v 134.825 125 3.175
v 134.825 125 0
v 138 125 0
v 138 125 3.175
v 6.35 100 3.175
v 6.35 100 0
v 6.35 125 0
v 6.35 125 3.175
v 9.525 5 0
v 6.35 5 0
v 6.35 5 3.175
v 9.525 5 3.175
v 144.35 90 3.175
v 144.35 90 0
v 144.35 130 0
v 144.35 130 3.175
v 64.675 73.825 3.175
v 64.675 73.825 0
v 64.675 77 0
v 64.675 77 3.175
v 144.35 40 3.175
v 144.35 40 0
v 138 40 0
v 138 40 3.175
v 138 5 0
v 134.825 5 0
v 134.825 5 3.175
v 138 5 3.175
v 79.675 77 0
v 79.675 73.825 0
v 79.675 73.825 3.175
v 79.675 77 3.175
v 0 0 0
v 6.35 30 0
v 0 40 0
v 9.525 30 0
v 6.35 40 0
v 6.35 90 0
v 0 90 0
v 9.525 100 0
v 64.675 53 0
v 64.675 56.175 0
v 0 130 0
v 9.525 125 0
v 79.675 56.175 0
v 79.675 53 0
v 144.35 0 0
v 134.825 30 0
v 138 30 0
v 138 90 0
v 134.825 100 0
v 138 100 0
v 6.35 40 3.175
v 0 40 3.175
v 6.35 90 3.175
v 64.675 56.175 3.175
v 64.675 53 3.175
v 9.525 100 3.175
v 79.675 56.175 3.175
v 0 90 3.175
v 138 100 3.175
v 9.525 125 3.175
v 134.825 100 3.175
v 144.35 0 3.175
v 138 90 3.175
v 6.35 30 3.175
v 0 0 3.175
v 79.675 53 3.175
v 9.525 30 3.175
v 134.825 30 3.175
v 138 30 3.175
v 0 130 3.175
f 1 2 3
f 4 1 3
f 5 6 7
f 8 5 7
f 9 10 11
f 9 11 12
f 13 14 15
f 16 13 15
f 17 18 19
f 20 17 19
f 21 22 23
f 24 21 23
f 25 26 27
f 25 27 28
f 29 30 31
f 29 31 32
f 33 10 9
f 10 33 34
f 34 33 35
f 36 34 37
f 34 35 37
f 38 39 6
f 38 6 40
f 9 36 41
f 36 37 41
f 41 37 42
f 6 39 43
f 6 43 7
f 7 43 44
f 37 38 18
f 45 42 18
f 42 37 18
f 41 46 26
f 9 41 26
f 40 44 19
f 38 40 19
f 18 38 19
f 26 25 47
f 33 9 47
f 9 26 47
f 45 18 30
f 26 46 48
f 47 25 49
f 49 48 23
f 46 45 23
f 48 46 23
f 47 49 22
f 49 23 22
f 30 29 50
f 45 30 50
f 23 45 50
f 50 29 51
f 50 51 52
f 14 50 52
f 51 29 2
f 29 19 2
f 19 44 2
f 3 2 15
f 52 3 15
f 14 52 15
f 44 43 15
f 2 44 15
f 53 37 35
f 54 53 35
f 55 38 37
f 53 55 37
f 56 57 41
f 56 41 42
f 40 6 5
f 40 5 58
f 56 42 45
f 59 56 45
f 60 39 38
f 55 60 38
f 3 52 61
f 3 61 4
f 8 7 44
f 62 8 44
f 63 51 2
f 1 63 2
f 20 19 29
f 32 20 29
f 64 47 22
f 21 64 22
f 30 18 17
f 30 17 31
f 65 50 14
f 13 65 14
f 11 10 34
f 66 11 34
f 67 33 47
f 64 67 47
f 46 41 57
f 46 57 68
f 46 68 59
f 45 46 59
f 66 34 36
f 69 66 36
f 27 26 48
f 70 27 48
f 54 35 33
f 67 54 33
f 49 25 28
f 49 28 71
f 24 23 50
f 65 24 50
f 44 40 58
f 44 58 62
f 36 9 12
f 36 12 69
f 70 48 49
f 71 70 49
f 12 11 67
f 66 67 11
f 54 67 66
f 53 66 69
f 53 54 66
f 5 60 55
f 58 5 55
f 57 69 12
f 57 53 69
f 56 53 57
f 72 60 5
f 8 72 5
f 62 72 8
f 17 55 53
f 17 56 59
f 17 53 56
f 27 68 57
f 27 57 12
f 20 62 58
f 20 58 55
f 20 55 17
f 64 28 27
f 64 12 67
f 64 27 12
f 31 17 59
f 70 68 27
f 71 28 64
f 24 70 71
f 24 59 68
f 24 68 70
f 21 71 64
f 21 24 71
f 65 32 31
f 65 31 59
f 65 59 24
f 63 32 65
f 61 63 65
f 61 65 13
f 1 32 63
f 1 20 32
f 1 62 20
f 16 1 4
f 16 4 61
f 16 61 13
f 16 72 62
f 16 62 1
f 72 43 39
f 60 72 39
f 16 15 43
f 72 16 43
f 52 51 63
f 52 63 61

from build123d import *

# Parameters (mm, degrees)
SKETCH1_W           = 3.175
SKETCH1_H           = 25
SKETCH1_W_2         = 15
SKETCH1_H_2         = 3.175
BOSS_EXTRUDE1_DEPTH = 3.175


with BuildPart() as part:
    # Sketch1 → Boss-Extrude1 (new body)
    with BuildSketch(Plane.XY):
        Polygon((0, 90), (6.35, 90), (6.35, 40), (0, 40), (0, 0), (144.35, 0), (144.35, 40), (138, 40), (138, 90), (144.35, 90), (144.35, 130), (0, 130), align=None)
        with Locations((7.9375, 112.5)):
            Rectangle(SKETCH1_W, SKETCH1_H, mode=Mode.SUBTRACT)
        with Locations((136.4125, 112.5)):
            Rectangle(SKETCH1_W, SKETCH1_H, mode=Mode.SUBTRACT)
        with Locations((7.9375, 17.5)):
            Rectangle(SKETCH1_W, SKETCH1_H, mode=Mode.SUBTRACT)
        with Locations((136.4125, 17.5)):
            Rectangle(SKETCH1_W, SKETCH1_H, mode=Mode.SUBTRACT)
        with Locations((72.175, 54.5875)):
            Rectangle(SKETCH1_W_2, SKETCH1_H_2, mode=Mode.SUBTRACT)
        with Locations((72.175, 75.4125)):
            Rectangle(SKETCH1_W_2, SKETCH1_H_2, mode=Mode.SUBTRACT)
    extrude(amount=BOSS_EXTRUDE1_DEPTH)


solid = part.part
